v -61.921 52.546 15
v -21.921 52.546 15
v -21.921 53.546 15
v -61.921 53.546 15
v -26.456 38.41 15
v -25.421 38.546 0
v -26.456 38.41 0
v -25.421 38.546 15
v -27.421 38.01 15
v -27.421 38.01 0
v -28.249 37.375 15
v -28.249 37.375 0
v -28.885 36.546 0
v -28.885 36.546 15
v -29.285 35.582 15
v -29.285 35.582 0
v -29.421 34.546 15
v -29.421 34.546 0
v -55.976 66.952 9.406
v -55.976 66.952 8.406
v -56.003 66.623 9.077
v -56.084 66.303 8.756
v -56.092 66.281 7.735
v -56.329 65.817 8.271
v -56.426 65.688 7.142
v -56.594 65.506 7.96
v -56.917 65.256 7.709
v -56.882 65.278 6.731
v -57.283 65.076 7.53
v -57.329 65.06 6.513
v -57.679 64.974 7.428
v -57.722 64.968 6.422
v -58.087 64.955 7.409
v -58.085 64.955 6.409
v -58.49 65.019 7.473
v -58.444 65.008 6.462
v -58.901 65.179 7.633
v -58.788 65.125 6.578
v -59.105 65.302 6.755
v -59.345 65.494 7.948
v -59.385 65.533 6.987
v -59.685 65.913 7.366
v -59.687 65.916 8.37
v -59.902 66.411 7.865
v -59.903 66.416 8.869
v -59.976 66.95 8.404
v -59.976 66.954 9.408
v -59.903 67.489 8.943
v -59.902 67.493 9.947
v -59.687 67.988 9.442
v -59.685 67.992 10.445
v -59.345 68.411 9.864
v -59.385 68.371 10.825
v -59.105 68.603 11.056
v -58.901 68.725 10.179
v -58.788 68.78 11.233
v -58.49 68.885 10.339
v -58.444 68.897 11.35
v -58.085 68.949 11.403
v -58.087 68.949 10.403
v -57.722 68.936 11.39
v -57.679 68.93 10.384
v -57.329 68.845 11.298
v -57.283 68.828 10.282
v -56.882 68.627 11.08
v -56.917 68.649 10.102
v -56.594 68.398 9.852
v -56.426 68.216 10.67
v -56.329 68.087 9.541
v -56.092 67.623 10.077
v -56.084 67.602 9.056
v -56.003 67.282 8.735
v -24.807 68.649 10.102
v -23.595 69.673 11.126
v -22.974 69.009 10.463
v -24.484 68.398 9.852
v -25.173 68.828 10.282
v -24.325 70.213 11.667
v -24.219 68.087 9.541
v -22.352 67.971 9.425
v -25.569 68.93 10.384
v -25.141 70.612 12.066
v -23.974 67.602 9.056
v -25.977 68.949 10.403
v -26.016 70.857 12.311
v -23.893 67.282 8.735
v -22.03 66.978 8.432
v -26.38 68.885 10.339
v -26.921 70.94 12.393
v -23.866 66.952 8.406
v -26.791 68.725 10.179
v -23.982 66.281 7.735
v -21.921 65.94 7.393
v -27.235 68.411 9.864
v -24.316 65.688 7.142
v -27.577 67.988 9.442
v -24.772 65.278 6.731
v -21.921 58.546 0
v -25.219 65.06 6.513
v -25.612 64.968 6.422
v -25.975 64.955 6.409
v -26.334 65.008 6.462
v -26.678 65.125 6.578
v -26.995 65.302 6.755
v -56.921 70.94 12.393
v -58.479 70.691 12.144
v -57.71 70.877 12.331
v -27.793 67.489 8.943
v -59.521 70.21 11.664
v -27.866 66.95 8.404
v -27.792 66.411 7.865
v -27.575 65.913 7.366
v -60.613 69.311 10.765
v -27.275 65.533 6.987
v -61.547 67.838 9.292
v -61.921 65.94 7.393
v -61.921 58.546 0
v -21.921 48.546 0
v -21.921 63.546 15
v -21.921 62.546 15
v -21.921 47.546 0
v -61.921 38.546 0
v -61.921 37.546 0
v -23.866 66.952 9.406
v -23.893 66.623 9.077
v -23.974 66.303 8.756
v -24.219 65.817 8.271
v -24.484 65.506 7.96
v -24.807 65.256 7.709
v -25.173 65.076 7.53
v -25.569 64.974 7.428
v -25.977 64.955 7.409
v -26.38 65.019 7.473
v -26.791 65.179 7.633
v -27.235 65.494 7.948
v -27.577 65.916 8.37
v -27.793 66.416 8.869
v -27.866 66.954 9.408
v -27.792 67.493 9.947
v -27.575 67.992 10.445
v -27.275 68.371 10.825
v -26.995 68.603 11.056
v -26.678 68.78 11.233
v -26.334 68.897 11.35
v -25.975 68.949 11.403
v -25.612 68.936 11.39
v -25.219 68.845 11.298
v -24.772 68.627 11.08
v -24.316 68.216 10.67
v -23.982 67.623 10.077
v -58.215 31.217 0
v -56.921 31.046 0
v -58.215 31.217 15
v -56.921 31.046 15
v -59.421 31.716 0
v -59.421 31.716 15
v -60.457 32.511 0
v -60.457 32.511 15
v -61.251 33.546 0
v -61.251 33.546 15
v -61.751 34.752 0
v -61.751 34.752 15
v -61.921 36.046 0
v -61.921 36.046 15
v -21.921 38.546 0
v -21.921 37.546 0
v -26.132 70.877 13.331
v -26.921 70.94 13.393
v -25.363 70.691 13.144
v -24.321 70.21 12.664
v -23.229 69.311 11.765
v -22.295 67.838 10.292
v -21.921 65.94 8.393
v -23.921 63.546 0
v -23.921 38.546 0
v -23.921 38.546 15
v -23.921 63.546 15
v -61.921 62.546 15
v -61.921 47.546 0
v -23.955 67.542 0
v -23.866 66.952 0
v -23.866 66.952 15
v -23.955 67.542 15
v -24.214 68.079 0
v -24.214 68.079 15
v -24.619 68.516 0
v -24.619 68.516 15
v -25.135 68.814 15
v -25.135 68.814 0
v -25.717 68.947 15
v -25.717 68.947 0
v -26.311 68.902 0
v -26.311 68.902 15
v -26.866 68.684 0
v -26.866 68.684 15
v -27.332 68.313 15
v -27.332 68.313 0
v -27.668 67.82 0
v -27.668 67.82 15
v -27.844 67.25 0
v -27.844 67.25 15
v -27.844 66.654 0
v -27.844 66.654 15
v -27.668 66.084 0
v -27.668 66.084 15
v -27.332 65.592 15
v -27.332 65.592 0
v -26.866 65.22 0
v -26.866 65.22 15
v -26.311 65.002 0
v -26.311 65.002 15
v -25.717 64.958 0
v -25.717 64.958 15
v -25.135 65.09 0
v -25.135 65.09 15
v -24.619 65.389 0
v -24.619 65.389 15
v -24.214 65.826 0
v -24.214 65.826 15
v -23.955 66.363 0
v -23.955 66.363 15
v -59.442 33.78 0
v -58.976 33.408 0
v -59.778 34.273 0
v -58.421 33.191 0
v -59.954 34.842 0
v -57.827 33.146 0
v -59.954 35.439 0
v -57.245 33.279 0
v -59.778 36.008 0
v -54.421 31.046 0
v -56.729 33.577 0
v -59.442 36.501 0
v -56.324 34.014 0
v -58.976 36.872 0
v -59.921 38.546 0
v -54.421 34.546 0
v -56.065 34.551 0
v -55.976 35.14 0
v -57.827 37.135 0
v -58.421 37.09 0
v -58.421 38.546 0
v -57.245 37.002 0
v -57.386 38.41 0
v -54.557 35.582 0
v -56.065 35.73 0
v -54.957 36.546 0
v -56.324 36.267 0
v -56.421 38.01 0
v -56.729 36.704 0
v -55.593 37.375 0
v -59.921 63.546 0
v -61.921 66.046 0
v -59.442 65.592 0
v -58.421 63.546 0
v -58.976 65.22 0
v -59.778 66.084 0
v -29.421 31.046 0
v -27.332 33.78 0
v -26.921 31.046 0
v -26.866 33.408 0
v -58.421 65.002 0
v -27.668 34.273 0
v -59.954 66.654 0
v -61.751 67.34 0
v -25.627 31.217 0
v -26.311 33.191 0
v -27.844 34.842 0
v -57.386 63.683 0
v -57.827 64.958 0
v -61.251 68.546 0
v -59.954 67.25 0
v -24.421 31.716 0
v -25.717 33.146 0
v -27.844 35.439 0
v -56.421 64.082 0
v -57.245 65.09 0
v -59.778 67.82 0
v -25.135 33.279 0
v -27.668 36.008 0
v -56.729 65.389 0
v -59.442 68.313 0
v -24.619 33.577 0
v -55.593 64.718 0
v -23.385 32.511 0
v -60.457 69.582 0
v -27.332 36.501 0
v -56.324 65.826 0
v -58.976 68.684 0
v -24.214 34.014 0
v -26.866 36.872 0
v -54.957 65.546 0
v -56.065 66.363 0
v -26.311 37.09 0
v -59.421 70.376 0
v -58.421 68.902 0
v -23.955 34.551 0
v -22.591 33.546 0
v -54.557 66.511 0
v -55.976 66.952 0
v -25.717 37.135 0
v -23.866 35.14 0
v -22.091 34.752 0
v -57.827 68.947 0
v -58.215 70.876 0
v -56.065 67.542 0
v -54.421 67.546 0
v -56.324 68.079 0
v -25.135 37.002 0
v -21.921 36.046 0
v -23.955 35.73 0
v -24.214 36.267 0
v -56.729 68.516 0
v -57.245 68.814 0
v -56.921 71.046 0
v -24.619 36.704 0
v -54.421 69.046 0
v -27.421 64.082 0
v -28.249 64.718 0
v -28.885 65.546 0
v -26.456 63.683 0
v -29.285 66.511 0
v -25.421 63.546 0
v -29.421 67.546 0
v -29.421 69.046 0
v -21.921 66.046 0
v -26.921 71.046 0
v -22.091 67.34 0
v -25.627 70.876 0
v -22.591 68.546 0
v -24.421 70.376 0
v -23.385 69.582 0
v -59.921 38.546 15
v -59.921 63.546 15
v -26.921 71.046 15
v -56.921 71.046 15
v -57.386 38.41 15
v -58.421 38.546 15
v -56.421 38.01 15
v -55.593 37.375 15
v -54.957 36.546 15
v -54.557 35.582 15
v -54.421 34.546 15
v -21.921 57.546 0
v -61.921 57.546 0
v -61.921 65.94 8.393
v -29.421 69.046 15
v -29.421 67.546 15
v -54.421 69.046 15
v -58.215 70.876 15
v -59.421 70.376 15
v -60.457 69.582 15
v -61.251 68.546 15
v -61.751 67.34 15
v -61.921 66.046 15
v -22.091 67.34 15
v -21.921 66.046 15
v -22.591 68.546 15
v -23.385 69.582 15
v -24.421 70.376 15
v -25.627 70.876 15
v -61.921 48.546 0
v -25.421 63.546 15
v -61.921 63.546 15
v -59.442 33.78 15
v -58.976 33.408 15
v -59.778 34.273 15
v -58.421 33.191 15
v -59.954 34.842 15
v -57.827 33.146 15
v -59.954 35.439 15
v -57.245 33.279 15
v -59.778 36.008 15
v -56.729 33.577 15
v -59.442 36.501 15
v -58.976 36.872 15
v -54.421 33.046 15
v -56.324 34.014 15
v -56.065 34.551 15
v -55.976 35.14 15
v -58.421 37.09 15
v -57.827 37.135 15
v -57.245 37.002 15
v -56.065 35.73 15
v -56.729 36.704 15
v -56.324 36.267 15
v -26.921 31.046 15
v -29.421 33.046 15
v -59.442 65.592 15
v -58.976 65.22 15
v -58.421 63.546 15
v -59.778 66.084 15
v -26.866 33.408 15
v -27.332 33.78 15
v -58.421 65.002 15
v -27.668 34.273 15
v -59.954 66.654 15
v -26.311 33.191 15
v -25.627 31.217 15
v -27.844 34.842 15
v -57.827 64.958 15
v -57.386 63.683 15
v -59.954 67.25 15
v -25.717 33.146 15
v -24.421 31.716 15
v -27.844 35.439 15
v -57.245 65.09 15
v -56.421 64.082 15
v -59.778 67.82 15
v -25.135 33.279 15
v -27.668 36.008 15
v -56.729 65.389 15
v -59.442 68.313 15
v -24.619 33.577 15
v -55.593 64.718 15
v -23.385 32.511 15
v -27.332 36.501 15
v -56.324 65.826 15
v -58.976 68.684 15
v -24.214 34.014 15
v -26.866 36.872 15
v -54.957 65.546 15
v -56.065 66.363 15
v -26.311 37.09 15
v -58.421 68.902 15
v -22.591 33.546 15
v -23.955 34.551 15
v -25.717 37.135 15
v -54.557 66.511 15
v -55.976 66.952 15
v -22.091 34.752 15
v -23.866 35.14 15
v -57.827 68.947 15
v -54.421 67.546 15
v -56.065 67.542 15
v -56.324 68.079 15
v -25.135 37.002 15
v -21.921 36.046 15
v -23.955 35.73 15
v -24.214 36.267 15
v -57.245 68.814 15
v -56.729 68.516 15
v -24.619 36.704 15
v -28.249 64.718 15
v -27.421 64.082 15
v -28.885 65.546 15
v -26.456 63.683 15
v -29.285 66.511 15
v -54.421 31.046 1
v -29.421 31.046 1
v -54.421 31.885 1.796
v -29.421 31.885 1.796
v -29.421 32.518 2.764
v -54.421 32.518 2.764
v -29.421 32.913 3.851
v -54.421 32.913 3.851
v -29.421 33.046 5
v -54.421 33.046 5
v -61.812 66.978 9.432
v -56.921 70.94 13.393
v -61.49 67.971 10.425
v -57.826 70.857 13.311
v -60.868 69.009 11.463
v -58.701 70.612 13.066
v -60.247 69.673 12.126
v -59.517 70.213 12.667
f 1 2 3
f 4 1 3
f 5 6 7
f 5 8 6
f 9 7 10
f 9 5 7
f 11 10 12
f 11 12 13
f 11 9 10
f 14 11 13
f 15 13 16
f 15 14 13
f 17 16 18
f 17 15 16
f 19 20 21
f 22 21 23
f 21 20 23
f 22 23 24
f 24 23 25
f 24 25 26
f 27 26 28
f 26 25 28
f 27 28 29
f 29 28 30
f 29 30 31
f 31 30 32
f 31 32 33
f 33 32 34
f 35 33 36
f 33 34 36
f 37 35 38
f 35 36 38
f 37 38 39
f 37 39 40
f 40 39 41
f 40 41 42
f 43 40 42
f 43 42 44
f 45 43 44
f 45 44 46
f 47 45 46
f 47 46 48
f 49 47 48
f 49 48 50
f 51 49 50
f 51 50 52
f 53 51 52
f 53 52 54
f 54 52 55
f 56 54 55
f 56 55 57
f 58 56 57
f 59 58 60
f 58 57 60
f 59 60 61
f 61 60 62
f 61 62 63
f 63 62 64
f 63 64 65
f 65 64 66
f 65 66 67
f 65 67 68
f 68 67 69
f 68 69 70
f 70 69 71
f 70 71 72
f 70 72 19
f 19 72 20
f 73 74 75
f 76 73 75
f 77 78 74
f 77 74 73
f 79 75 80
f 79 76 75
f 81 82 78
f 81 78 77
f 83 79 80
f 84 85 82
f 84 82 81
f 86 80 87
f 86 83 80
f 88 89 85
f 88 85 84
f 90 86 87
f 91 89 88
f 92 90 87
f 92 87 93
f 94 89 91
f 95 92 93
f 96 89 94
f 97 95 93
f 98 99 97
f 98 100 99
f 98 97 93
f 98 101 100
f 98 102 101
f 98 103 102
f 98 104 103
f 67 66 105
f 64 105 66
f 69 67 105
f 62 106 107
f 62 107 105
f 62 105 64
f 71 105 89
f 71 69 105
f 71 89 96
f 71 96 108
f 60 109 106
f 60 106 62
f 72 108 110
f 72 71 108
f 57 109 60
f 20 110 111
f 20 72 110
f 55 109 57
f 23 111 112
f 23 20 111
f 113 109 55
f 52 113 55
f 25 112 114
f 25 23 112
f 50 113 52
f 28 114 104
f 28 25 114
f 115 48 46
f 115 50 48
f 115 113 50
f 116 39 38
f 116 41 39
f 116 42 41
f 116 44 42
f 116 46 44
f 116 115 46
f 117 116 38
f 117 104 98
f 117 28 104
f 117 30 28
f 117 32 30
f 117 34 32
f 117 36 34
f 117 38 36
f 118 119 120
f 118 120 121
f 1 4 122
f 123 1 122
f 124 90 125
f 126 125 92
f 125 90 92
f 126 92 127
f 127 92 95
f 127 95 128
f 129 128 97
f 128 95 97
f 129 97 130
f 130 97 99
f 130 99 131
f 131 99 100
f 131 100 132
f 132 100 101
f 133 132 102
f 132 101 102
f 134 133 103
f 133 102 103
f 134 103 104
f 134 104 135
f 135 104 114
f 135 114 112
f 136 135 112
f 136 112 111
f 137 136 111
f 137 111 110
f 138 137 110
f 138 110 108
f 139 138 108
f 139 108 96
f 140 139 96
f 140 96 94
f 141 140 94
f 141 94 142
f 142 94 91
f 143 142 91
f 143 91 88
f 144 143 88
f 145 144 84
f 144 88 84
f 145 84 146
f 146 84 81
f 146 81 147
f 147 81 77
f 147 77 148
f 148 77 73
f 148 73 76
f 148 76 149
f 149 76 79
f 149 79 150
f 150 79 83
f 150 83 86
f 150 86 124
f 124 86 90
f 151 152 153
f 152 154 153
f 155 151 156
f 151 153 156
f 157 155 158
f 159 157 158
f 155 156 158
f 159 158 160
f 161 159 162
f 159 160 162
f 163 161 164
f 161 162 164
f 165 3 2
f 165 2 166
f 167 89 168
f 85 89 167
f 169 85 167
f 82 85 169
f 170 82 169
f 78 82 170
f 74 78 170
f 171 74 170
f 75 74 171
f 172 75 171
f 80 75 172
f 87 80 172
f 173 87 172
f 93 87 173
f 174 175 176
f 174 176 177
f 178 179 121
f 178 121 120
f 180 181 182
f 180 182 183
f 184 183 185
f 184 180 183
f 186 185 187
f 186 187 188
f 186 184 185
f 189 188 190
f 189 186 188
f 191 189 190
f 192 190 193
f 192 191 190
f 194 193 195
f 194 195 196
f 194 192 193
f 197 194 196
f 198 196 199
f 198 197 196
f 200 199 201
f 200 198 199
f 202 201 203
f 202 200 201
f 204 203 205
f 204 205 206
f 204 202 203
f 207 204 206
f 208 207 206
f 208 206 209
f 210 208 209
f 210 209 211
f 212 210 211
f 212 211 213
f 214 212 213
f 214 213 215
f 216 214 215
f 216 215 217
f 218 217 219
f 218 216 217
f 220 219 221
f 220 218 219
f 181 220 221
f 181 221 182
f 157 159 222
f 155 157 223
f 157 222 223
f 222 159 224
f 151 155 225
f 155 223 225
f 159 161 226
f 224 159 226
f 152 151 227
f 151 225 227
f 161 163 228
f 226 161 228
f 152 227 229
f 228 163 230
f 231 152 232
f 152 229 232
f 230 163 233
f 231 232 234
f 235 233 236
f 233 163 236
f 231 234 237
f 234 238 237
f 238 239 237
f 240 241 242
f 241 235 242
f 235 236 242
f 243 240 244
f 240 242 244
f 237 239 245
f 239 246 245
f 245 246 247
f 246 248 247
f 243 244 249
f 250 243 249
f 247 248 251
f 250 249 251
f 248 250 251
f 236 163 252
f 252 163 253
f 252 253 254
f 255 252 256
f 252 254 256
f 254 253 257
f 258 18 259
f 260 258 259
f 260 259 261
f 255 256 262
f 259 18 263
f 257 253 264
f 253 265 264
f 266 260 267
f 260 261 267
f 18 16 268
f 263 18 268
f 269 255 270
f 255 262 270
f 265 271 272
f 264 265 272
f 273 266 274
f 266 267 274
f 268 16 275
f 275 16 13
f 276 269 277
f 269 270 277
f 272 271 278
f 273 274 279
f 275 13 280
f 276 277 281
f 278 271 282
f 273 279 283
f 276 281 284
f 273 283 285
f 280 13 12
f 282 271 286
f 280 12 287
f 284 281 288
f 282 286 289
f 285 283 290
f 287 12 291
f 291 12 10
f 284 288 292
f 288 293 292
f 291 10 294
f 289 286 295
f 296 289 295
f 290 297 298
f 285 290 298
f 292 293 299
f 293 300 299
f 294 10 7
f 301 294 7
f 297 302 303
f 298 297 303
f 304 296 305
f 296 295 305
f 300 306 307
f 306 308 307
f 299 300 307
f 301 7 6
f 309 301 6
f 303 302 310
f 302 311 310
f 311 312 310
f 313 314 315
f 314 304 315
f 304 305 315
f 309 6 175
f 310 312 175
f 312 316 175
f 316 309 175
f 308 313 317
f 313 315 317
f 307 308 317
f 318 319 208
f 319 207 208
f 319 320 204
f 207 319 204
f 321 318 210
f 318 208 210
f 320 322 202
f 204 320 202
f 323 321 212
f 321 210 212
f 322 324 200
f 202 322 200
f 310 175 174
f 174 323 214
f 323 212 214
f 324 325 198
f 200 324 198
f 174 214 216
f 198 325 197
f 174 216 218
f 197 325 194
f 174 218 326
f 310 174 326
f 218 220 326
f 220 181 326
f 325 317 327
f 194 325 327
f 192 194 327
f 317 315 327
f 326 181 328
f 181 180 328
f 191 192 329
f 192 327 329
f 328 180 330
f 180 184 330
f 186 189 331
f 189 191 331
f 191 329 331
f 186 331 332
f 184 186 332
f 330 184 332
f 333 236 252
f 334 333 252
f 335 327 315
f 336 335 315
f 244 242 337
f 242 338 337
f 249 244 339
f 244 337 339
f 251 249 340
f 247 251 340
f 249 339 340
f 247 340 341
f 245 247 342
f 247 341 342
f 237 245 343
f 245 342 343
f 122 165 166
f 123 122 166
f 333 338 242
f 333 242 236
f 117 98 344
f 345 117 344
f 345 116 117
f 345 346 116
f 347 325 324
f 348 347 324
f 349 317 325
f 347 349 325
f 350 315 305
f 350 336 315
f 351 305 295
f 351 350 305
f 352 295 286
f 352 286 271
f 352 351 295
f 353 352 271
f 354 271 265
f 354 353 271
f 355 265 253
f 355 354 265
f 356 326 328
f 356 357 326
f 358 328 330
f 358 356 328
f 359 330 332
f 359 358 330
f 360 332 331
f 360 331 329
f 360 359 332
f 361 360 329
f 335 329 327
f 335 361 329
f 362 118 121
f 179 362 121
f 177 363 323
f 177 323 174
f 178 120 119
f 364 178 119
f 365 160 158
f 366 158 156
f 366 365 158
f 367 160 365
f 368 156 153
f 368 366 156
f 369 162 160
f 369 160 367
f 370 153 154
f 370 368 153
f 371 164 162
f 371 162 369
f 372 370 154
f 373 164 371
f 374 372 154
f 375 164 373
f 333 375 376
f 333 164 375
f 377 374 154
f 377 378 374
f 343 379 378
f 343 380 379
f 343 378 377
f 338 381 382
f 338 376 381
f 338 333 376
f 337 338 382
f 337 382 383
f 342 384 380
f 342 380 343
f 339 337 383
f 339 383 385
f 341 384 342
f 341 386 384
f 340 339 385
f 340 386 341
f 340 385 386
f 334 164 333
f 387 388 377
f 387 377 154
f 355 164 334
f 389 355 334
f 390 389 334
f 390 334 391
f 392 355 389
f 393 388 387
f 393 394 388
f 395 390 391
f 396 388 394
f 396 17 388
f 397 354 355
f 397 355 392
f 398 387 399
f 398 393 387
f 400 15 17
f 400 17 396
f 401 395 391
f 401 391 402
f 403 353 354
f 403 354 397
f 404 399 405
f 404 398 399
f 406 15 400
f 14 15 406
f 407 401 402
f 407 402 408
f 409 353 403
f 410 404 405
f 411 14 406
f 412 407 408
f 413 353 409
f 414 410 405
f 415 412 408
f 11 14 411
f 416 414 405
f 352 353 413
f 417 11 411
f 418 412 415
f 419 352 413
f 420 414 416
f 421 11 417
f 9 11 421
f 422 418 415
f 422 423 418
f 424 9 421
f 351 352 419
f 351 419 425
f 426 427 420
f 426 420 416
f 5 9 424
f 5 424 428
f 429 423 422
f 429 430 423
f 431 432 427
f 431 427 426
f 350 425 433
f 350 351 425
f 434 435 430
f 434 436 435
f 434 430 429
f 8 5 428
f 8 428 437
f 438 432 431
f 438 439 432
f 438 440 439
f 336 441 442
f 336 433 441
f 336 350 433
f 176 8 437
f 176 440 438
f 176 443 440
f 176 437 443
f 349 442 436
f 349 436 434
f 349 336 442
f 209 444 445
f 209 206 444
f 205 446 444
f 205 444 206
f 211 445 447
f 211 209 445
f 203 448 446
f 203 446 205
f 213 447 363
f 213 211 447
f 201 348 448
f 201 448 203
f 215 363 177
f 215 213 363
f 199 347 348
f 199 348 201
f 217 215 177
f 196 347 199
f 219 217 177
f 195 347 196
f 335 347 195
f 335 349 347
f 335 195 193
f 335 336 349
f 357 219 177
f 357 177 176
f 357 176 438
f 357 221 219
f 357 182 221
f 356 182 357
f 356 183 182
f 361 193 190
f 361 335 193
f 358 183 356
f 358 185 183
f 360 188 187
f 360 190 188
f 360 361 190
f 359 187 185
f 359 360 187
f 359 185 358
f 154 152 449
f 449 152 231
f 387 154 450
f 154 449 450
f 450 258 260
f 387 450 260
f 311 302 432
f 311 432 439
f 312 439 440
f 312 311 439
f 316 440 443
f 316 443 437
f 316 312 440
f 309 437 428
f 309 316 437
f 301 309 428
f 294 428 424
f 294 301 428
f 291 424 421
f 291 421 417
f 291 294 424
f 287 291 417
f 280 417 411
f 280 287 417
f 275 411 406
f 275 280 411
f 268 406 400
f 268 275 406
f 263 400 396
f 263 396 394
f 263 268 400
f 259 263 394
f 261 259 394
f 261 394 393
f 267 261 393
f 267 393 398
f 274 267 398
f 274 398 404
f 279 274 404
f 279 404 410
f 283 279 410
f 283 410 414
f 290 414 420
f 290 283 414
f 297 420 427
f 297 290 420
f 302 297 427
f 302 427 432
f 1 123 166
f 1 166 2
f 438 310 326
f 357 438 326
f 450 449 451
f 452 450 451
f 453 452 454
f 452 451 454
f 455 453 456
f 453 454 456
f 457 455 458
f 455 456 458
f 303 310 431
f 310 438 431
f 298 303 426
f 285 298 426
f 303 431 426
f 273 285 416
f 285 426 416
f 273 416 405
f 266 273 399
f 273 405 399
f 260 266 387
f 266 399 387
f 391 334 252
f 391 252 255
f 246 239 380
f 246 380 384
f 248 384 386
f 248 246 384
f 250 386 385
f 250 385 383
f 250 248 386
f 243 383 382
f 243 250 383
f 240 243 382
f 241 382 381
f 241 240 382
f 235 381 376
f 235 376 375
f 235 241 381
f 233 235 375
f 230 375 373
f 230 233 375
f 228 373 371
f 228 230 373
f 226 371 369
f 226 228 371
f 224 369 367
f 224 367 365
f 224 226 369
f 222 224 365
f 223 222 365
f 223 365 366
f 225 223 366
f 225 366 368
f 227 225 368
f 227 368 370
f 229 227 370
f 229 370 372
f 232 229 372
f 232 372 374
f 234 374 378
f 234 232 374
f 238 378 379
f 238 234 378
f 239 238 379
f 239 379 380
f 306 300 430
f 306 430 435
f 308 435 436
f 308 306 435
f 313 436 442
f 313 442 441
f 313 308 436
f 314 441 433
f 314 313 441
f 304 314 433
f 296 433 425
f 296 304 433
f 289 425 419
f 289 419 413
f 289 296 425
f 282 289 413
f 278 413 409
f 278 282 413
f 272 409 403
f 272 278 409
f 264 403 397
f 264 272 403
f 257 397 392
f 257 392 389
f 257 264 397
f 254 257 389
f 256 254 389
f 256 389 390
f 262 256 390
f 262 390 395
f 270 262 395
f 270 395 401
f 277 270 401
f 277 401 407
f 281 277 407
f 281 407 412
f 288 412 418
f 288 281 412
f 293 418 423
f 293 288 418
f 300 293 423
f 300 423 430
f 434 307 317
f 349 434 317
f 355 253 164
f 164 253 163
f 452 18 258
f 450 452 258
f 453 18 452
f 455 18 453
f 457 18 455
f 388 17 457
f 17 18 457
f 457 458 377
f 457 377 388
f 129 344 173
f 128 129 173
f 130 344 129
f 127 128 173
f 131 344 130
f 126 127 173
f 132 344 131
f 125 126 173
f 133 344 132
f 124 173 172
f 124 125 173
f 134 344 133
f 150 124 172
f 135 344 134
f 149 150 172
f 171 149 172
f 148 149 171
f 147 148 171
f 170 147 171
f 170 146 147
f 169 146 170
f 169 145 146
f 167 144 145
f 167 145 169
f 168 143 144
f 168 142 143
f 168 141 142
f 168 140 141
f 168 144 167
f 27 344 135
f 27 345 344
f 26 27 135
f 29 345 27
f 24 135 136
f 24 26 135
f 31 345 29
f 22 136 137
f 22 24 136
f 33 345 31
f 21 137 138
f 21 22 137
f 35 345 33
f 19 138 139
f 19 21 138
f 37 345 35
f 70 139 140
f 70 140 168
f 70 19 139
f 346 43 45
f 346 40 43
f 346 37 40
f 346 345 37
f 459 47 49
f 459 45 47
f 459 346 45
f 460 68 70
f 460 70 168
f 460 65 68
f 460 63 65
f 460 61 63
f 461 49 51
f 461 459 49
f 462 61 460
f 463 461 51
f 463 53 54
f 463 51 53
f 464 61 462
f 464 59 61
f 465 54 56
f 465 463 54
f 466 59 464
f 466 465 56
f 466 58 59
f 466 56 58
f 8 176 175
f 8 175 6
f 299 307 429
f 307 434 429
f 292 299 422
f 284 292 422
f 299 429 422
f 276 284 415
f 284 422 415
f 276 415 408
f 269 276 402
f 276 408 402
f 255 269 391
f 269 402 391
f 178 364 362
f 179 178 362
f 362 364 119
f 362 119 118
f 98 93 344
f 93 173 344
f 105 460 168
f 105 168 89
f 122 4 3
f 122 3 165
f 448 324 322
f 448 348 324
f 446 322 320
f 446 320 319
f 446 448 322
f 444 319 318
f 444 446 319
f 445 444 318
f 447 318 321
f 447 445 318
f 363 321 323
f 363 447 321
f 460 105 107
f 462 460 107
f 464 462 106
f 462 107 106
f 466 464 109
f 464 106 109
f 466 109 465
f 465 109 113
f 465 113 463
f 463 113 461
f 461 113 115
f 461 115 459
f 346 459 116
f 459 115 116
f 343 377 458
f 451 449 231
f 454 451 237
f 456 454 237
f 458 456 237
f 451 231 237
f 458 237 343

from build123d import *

# Parameters (mm, degrees)
F0_R        = 2
F0_W        = 25
F0_H        = 2
F0_W_2      = 2
F0_H_2      = 25
F1_DEPTH    = 15
F2_R        = 5
F3_R        = 4
F5_DEPTH    = 40
F6_T1_DEPTH = 26
F7_R        = 2
F8_DEPTH    = 25
F9_T1_DEPTH = 25


# Not quite as in the source:
# - a fillet or chamfer that OpenCascade refuses, or shapes differently, is made with other operations: its cross-section is extruded or revolved along the edge and cut away or added


with BuildPart() as f1:
    # F0 (on Top) → F1 (new body)
    with BuildSketch(Plane.XY):
        Polygon((-29.4209998254, 31.0463201136), (-21.9209998254, 31.0463201136), (-21.9209998254, 38.5463201136), (-23.9209998254, 38.5463201136), (-29.4209998254, 38.5463201136), (-29.4209998254, 33.0463201136), align=None)
        with Locations((-25.8659998254, 35.1404414833)):
            Circle(F0_R, mode=Mode.SUBTRACT)
        with Locations((-41.9209998254, 32.0463201136)):
            Rectangle(F0_W, F0_H)
        with Locations((-22.9209998254, 51.0463201136)):
            Rectangle(F0_W_2, F0_H_2)
        Polygon((-61.9209998254, 31.0463201136), (-54.4209998254, 31.0463201136), (-54.4209998254, 33.0463201136), (-54.4209998254, 38.5463201136), (-59.9209998254, 38.5463201136), (-61.9209998254, 38.5463201136), align=None)
        with Locations((-57.9759998254, 35.1404414833)):
            Circle(F0_R, mode=Mode.SUBTRACT)
        Polygon((-23.9209998254, 63.5463201136), (-21.9209998254, 63.5463201136), (-21.9209998254, 71.0463201136), (-29.4209998254, 71.0463201136), (-29.4209998254, 69.0463201136), (-29.4209998254, 63.5463201136), align=None)
        with Locations((-25.8659998254, 66.9521987438)):
            Circle(F0_R, mode=Mode.SUBTRACT)
        with Locations((-60.9209998254, 51.0463201136)):
            Rectangle(F0_W_2, F0_H_2)
        with Locations((-41.9209998254, 70.0463201136)):
            Rectangle(F0_W, F0_H)
        Polygon((-61.9209998254, 71.0463201136), (-61.9209998254, 63.5463201136), (-59.9209998254, 63.5463201136), (-54.4209998254, 63.5463201136), (-54.4209998254, 69.0463201136), (-54.4209998254, 71.0463201136), align=None)
        with Locations((-57.9759998254, 66.9521987438)):
            Circle(F0_R, mode=Mode.SUBTRACT)
    extrude(amount=F1_DEPTH)

    # F2
    f2_edges = [f1.edges().sort_by_distance(p)[0] for p in [
        (-61.921, 71.04632, 7.5),
        (-61.921, 31.04632, 7.5),
        (-21.921, 31.04632, 7.5),
        (-21.921, 71.04632, 7.5),
    ]]
    fillet(f2_edges, radius=F2_R)

    # F3
    f3_edges = [f1.edges().sort_by_distance(p)[0] for p in [
        (-54.421, 63.54632, 7.5),
        (-29.421, 63.54632, 7.5),
        (-29.421, 38.54632, 7.5),
        (-54.421, 38.54632, 7.5),
    ]]
    fillet(f3_edges, radius=F3_R)

    # F9: fillet of radius 5 on 1 edges, made by hand

    # F9_s2 → F9_t1 (cut)
    with BuildSketch(Plane.YZ.offset(-54.4209998254)):
        with BuildLine():
            ThreePointArc((28.0463201136, 0), (31.5818540195, 1.4644660941), (33.0463201136, 5))
            Line((33.0463201136, 5), (33.0463201136, 0))
            Line((33.0463201136, 0), (28.0463201136, 0))
        make_face()
    extrude(amount=F9_T1_DEPTH, mode=Mode.SUBTRACT)


with BuildPart() as f5:
    # F4 (on face) → F5 (new body)
    with BuildSketch(Plane(origin=(-61.9209998254, 0, 0), x_dir=(0, -1, 0), z_dir=(-1, 0, 0))):
        Polygon((-66.0463201136, 8.5), (-66.0463201136, 7.5), (-58.5463201136, 0), (-57.5463201136, 0), align=None)
        Polygon((-70.9395914093, 12.3932712957), (-66.0463201136, 7.5), (-66.0463201136, 8.5), (-70.9395914093, 13.3932712957), align=None)
    extrude(amount=-F5_DEPTH)

    # F6: fillet of radius 5 on 2 edges, made by hand

    # F6_s2 → F6_t1 (cut)
    with BuildSketch(Plane.XY.offset(-0.1067287043)):
        with BuildLine():
            ThreePointArc((-56.9209998254, 70.9395914093), (-60.4565337313, 69.4751253152), (-61.9209998254, 65.9395914093))
            Line((-61.9209998254, 65.9395914093), (-61.9209998254, 70.9395914093))
            Line((-61.9209998254, 70.9395914093), (-56.9209998254, 70.9395914093))
        make_face()
        with BuildLine():
            ThreePointArc((-26.9209998254, 70.9395914093), (-23.3854659194, 69.4751253152), (-21.9209998254, 65.9395914093))
            Line((-21.9209998254, 65.9395914093), (-21.9209998254, 70.9395914093))
            Line((-21.9209998254, 70.9395914093), (-26.9209998254, 70.9395914093))
        make_face()
    extrude(amount=F6_T1_DEPTH, mode=Mode.SUBTRACT)

    # F7 (on face) → F8 (cut)
    with BuildSketch(Plane(origin=(0, 0, 0), x_dir=(1, 0, 0), z_dir=(0, 0, -1))):
        with Locations((-25.8659998254, -66.9521987438)):
            Circle(F7_R)
        with Locations((-57.9759998254, -66.9521987438)):
            Circle(F7_R)
    extrude(amount=-F8_DEPTH, mode=Mode.SUBTRACT)


with BuildPart() as f5b:
    # F4 (on face) → F5, piece 2 (new body)
    with BuildSketch(Plane(origin=(-61.9209998254, 0, 0), x_dir=(0, -1, 0), z_dir=(-1, 0, 0))):
        Polygon((-63.5463201136, 15), (-56.0463201136, 7.5), (-48.5463201136, 0), (-47.5463201136, 0), (-56.0463201136, 8.5), (-62.5463201136, 15), align=None)
    extrude(amount=-F5_DEPTH)


with BuildPart() as f5c:
    # F4 (on face) → F5, piece 3 (new body)
    with BuildSketch(Plane(origin=(-61.9209998254, 0, 0), x_dir=(0, -1, 0), z_dir=(-1, 0, 0))):
        Polygon((-53.5463201136, 15), (-46.0463201136, 7.5), (-38.5463201136, 0), (-37.5463201136, 0), (-46.0463201136, 8.5), (-52.5463201136, 15), align=None)
    extrude(amount=-F5_DEPTH)


solid = Compound([f1.part, f5.part, f5b.part, f5c.part])
